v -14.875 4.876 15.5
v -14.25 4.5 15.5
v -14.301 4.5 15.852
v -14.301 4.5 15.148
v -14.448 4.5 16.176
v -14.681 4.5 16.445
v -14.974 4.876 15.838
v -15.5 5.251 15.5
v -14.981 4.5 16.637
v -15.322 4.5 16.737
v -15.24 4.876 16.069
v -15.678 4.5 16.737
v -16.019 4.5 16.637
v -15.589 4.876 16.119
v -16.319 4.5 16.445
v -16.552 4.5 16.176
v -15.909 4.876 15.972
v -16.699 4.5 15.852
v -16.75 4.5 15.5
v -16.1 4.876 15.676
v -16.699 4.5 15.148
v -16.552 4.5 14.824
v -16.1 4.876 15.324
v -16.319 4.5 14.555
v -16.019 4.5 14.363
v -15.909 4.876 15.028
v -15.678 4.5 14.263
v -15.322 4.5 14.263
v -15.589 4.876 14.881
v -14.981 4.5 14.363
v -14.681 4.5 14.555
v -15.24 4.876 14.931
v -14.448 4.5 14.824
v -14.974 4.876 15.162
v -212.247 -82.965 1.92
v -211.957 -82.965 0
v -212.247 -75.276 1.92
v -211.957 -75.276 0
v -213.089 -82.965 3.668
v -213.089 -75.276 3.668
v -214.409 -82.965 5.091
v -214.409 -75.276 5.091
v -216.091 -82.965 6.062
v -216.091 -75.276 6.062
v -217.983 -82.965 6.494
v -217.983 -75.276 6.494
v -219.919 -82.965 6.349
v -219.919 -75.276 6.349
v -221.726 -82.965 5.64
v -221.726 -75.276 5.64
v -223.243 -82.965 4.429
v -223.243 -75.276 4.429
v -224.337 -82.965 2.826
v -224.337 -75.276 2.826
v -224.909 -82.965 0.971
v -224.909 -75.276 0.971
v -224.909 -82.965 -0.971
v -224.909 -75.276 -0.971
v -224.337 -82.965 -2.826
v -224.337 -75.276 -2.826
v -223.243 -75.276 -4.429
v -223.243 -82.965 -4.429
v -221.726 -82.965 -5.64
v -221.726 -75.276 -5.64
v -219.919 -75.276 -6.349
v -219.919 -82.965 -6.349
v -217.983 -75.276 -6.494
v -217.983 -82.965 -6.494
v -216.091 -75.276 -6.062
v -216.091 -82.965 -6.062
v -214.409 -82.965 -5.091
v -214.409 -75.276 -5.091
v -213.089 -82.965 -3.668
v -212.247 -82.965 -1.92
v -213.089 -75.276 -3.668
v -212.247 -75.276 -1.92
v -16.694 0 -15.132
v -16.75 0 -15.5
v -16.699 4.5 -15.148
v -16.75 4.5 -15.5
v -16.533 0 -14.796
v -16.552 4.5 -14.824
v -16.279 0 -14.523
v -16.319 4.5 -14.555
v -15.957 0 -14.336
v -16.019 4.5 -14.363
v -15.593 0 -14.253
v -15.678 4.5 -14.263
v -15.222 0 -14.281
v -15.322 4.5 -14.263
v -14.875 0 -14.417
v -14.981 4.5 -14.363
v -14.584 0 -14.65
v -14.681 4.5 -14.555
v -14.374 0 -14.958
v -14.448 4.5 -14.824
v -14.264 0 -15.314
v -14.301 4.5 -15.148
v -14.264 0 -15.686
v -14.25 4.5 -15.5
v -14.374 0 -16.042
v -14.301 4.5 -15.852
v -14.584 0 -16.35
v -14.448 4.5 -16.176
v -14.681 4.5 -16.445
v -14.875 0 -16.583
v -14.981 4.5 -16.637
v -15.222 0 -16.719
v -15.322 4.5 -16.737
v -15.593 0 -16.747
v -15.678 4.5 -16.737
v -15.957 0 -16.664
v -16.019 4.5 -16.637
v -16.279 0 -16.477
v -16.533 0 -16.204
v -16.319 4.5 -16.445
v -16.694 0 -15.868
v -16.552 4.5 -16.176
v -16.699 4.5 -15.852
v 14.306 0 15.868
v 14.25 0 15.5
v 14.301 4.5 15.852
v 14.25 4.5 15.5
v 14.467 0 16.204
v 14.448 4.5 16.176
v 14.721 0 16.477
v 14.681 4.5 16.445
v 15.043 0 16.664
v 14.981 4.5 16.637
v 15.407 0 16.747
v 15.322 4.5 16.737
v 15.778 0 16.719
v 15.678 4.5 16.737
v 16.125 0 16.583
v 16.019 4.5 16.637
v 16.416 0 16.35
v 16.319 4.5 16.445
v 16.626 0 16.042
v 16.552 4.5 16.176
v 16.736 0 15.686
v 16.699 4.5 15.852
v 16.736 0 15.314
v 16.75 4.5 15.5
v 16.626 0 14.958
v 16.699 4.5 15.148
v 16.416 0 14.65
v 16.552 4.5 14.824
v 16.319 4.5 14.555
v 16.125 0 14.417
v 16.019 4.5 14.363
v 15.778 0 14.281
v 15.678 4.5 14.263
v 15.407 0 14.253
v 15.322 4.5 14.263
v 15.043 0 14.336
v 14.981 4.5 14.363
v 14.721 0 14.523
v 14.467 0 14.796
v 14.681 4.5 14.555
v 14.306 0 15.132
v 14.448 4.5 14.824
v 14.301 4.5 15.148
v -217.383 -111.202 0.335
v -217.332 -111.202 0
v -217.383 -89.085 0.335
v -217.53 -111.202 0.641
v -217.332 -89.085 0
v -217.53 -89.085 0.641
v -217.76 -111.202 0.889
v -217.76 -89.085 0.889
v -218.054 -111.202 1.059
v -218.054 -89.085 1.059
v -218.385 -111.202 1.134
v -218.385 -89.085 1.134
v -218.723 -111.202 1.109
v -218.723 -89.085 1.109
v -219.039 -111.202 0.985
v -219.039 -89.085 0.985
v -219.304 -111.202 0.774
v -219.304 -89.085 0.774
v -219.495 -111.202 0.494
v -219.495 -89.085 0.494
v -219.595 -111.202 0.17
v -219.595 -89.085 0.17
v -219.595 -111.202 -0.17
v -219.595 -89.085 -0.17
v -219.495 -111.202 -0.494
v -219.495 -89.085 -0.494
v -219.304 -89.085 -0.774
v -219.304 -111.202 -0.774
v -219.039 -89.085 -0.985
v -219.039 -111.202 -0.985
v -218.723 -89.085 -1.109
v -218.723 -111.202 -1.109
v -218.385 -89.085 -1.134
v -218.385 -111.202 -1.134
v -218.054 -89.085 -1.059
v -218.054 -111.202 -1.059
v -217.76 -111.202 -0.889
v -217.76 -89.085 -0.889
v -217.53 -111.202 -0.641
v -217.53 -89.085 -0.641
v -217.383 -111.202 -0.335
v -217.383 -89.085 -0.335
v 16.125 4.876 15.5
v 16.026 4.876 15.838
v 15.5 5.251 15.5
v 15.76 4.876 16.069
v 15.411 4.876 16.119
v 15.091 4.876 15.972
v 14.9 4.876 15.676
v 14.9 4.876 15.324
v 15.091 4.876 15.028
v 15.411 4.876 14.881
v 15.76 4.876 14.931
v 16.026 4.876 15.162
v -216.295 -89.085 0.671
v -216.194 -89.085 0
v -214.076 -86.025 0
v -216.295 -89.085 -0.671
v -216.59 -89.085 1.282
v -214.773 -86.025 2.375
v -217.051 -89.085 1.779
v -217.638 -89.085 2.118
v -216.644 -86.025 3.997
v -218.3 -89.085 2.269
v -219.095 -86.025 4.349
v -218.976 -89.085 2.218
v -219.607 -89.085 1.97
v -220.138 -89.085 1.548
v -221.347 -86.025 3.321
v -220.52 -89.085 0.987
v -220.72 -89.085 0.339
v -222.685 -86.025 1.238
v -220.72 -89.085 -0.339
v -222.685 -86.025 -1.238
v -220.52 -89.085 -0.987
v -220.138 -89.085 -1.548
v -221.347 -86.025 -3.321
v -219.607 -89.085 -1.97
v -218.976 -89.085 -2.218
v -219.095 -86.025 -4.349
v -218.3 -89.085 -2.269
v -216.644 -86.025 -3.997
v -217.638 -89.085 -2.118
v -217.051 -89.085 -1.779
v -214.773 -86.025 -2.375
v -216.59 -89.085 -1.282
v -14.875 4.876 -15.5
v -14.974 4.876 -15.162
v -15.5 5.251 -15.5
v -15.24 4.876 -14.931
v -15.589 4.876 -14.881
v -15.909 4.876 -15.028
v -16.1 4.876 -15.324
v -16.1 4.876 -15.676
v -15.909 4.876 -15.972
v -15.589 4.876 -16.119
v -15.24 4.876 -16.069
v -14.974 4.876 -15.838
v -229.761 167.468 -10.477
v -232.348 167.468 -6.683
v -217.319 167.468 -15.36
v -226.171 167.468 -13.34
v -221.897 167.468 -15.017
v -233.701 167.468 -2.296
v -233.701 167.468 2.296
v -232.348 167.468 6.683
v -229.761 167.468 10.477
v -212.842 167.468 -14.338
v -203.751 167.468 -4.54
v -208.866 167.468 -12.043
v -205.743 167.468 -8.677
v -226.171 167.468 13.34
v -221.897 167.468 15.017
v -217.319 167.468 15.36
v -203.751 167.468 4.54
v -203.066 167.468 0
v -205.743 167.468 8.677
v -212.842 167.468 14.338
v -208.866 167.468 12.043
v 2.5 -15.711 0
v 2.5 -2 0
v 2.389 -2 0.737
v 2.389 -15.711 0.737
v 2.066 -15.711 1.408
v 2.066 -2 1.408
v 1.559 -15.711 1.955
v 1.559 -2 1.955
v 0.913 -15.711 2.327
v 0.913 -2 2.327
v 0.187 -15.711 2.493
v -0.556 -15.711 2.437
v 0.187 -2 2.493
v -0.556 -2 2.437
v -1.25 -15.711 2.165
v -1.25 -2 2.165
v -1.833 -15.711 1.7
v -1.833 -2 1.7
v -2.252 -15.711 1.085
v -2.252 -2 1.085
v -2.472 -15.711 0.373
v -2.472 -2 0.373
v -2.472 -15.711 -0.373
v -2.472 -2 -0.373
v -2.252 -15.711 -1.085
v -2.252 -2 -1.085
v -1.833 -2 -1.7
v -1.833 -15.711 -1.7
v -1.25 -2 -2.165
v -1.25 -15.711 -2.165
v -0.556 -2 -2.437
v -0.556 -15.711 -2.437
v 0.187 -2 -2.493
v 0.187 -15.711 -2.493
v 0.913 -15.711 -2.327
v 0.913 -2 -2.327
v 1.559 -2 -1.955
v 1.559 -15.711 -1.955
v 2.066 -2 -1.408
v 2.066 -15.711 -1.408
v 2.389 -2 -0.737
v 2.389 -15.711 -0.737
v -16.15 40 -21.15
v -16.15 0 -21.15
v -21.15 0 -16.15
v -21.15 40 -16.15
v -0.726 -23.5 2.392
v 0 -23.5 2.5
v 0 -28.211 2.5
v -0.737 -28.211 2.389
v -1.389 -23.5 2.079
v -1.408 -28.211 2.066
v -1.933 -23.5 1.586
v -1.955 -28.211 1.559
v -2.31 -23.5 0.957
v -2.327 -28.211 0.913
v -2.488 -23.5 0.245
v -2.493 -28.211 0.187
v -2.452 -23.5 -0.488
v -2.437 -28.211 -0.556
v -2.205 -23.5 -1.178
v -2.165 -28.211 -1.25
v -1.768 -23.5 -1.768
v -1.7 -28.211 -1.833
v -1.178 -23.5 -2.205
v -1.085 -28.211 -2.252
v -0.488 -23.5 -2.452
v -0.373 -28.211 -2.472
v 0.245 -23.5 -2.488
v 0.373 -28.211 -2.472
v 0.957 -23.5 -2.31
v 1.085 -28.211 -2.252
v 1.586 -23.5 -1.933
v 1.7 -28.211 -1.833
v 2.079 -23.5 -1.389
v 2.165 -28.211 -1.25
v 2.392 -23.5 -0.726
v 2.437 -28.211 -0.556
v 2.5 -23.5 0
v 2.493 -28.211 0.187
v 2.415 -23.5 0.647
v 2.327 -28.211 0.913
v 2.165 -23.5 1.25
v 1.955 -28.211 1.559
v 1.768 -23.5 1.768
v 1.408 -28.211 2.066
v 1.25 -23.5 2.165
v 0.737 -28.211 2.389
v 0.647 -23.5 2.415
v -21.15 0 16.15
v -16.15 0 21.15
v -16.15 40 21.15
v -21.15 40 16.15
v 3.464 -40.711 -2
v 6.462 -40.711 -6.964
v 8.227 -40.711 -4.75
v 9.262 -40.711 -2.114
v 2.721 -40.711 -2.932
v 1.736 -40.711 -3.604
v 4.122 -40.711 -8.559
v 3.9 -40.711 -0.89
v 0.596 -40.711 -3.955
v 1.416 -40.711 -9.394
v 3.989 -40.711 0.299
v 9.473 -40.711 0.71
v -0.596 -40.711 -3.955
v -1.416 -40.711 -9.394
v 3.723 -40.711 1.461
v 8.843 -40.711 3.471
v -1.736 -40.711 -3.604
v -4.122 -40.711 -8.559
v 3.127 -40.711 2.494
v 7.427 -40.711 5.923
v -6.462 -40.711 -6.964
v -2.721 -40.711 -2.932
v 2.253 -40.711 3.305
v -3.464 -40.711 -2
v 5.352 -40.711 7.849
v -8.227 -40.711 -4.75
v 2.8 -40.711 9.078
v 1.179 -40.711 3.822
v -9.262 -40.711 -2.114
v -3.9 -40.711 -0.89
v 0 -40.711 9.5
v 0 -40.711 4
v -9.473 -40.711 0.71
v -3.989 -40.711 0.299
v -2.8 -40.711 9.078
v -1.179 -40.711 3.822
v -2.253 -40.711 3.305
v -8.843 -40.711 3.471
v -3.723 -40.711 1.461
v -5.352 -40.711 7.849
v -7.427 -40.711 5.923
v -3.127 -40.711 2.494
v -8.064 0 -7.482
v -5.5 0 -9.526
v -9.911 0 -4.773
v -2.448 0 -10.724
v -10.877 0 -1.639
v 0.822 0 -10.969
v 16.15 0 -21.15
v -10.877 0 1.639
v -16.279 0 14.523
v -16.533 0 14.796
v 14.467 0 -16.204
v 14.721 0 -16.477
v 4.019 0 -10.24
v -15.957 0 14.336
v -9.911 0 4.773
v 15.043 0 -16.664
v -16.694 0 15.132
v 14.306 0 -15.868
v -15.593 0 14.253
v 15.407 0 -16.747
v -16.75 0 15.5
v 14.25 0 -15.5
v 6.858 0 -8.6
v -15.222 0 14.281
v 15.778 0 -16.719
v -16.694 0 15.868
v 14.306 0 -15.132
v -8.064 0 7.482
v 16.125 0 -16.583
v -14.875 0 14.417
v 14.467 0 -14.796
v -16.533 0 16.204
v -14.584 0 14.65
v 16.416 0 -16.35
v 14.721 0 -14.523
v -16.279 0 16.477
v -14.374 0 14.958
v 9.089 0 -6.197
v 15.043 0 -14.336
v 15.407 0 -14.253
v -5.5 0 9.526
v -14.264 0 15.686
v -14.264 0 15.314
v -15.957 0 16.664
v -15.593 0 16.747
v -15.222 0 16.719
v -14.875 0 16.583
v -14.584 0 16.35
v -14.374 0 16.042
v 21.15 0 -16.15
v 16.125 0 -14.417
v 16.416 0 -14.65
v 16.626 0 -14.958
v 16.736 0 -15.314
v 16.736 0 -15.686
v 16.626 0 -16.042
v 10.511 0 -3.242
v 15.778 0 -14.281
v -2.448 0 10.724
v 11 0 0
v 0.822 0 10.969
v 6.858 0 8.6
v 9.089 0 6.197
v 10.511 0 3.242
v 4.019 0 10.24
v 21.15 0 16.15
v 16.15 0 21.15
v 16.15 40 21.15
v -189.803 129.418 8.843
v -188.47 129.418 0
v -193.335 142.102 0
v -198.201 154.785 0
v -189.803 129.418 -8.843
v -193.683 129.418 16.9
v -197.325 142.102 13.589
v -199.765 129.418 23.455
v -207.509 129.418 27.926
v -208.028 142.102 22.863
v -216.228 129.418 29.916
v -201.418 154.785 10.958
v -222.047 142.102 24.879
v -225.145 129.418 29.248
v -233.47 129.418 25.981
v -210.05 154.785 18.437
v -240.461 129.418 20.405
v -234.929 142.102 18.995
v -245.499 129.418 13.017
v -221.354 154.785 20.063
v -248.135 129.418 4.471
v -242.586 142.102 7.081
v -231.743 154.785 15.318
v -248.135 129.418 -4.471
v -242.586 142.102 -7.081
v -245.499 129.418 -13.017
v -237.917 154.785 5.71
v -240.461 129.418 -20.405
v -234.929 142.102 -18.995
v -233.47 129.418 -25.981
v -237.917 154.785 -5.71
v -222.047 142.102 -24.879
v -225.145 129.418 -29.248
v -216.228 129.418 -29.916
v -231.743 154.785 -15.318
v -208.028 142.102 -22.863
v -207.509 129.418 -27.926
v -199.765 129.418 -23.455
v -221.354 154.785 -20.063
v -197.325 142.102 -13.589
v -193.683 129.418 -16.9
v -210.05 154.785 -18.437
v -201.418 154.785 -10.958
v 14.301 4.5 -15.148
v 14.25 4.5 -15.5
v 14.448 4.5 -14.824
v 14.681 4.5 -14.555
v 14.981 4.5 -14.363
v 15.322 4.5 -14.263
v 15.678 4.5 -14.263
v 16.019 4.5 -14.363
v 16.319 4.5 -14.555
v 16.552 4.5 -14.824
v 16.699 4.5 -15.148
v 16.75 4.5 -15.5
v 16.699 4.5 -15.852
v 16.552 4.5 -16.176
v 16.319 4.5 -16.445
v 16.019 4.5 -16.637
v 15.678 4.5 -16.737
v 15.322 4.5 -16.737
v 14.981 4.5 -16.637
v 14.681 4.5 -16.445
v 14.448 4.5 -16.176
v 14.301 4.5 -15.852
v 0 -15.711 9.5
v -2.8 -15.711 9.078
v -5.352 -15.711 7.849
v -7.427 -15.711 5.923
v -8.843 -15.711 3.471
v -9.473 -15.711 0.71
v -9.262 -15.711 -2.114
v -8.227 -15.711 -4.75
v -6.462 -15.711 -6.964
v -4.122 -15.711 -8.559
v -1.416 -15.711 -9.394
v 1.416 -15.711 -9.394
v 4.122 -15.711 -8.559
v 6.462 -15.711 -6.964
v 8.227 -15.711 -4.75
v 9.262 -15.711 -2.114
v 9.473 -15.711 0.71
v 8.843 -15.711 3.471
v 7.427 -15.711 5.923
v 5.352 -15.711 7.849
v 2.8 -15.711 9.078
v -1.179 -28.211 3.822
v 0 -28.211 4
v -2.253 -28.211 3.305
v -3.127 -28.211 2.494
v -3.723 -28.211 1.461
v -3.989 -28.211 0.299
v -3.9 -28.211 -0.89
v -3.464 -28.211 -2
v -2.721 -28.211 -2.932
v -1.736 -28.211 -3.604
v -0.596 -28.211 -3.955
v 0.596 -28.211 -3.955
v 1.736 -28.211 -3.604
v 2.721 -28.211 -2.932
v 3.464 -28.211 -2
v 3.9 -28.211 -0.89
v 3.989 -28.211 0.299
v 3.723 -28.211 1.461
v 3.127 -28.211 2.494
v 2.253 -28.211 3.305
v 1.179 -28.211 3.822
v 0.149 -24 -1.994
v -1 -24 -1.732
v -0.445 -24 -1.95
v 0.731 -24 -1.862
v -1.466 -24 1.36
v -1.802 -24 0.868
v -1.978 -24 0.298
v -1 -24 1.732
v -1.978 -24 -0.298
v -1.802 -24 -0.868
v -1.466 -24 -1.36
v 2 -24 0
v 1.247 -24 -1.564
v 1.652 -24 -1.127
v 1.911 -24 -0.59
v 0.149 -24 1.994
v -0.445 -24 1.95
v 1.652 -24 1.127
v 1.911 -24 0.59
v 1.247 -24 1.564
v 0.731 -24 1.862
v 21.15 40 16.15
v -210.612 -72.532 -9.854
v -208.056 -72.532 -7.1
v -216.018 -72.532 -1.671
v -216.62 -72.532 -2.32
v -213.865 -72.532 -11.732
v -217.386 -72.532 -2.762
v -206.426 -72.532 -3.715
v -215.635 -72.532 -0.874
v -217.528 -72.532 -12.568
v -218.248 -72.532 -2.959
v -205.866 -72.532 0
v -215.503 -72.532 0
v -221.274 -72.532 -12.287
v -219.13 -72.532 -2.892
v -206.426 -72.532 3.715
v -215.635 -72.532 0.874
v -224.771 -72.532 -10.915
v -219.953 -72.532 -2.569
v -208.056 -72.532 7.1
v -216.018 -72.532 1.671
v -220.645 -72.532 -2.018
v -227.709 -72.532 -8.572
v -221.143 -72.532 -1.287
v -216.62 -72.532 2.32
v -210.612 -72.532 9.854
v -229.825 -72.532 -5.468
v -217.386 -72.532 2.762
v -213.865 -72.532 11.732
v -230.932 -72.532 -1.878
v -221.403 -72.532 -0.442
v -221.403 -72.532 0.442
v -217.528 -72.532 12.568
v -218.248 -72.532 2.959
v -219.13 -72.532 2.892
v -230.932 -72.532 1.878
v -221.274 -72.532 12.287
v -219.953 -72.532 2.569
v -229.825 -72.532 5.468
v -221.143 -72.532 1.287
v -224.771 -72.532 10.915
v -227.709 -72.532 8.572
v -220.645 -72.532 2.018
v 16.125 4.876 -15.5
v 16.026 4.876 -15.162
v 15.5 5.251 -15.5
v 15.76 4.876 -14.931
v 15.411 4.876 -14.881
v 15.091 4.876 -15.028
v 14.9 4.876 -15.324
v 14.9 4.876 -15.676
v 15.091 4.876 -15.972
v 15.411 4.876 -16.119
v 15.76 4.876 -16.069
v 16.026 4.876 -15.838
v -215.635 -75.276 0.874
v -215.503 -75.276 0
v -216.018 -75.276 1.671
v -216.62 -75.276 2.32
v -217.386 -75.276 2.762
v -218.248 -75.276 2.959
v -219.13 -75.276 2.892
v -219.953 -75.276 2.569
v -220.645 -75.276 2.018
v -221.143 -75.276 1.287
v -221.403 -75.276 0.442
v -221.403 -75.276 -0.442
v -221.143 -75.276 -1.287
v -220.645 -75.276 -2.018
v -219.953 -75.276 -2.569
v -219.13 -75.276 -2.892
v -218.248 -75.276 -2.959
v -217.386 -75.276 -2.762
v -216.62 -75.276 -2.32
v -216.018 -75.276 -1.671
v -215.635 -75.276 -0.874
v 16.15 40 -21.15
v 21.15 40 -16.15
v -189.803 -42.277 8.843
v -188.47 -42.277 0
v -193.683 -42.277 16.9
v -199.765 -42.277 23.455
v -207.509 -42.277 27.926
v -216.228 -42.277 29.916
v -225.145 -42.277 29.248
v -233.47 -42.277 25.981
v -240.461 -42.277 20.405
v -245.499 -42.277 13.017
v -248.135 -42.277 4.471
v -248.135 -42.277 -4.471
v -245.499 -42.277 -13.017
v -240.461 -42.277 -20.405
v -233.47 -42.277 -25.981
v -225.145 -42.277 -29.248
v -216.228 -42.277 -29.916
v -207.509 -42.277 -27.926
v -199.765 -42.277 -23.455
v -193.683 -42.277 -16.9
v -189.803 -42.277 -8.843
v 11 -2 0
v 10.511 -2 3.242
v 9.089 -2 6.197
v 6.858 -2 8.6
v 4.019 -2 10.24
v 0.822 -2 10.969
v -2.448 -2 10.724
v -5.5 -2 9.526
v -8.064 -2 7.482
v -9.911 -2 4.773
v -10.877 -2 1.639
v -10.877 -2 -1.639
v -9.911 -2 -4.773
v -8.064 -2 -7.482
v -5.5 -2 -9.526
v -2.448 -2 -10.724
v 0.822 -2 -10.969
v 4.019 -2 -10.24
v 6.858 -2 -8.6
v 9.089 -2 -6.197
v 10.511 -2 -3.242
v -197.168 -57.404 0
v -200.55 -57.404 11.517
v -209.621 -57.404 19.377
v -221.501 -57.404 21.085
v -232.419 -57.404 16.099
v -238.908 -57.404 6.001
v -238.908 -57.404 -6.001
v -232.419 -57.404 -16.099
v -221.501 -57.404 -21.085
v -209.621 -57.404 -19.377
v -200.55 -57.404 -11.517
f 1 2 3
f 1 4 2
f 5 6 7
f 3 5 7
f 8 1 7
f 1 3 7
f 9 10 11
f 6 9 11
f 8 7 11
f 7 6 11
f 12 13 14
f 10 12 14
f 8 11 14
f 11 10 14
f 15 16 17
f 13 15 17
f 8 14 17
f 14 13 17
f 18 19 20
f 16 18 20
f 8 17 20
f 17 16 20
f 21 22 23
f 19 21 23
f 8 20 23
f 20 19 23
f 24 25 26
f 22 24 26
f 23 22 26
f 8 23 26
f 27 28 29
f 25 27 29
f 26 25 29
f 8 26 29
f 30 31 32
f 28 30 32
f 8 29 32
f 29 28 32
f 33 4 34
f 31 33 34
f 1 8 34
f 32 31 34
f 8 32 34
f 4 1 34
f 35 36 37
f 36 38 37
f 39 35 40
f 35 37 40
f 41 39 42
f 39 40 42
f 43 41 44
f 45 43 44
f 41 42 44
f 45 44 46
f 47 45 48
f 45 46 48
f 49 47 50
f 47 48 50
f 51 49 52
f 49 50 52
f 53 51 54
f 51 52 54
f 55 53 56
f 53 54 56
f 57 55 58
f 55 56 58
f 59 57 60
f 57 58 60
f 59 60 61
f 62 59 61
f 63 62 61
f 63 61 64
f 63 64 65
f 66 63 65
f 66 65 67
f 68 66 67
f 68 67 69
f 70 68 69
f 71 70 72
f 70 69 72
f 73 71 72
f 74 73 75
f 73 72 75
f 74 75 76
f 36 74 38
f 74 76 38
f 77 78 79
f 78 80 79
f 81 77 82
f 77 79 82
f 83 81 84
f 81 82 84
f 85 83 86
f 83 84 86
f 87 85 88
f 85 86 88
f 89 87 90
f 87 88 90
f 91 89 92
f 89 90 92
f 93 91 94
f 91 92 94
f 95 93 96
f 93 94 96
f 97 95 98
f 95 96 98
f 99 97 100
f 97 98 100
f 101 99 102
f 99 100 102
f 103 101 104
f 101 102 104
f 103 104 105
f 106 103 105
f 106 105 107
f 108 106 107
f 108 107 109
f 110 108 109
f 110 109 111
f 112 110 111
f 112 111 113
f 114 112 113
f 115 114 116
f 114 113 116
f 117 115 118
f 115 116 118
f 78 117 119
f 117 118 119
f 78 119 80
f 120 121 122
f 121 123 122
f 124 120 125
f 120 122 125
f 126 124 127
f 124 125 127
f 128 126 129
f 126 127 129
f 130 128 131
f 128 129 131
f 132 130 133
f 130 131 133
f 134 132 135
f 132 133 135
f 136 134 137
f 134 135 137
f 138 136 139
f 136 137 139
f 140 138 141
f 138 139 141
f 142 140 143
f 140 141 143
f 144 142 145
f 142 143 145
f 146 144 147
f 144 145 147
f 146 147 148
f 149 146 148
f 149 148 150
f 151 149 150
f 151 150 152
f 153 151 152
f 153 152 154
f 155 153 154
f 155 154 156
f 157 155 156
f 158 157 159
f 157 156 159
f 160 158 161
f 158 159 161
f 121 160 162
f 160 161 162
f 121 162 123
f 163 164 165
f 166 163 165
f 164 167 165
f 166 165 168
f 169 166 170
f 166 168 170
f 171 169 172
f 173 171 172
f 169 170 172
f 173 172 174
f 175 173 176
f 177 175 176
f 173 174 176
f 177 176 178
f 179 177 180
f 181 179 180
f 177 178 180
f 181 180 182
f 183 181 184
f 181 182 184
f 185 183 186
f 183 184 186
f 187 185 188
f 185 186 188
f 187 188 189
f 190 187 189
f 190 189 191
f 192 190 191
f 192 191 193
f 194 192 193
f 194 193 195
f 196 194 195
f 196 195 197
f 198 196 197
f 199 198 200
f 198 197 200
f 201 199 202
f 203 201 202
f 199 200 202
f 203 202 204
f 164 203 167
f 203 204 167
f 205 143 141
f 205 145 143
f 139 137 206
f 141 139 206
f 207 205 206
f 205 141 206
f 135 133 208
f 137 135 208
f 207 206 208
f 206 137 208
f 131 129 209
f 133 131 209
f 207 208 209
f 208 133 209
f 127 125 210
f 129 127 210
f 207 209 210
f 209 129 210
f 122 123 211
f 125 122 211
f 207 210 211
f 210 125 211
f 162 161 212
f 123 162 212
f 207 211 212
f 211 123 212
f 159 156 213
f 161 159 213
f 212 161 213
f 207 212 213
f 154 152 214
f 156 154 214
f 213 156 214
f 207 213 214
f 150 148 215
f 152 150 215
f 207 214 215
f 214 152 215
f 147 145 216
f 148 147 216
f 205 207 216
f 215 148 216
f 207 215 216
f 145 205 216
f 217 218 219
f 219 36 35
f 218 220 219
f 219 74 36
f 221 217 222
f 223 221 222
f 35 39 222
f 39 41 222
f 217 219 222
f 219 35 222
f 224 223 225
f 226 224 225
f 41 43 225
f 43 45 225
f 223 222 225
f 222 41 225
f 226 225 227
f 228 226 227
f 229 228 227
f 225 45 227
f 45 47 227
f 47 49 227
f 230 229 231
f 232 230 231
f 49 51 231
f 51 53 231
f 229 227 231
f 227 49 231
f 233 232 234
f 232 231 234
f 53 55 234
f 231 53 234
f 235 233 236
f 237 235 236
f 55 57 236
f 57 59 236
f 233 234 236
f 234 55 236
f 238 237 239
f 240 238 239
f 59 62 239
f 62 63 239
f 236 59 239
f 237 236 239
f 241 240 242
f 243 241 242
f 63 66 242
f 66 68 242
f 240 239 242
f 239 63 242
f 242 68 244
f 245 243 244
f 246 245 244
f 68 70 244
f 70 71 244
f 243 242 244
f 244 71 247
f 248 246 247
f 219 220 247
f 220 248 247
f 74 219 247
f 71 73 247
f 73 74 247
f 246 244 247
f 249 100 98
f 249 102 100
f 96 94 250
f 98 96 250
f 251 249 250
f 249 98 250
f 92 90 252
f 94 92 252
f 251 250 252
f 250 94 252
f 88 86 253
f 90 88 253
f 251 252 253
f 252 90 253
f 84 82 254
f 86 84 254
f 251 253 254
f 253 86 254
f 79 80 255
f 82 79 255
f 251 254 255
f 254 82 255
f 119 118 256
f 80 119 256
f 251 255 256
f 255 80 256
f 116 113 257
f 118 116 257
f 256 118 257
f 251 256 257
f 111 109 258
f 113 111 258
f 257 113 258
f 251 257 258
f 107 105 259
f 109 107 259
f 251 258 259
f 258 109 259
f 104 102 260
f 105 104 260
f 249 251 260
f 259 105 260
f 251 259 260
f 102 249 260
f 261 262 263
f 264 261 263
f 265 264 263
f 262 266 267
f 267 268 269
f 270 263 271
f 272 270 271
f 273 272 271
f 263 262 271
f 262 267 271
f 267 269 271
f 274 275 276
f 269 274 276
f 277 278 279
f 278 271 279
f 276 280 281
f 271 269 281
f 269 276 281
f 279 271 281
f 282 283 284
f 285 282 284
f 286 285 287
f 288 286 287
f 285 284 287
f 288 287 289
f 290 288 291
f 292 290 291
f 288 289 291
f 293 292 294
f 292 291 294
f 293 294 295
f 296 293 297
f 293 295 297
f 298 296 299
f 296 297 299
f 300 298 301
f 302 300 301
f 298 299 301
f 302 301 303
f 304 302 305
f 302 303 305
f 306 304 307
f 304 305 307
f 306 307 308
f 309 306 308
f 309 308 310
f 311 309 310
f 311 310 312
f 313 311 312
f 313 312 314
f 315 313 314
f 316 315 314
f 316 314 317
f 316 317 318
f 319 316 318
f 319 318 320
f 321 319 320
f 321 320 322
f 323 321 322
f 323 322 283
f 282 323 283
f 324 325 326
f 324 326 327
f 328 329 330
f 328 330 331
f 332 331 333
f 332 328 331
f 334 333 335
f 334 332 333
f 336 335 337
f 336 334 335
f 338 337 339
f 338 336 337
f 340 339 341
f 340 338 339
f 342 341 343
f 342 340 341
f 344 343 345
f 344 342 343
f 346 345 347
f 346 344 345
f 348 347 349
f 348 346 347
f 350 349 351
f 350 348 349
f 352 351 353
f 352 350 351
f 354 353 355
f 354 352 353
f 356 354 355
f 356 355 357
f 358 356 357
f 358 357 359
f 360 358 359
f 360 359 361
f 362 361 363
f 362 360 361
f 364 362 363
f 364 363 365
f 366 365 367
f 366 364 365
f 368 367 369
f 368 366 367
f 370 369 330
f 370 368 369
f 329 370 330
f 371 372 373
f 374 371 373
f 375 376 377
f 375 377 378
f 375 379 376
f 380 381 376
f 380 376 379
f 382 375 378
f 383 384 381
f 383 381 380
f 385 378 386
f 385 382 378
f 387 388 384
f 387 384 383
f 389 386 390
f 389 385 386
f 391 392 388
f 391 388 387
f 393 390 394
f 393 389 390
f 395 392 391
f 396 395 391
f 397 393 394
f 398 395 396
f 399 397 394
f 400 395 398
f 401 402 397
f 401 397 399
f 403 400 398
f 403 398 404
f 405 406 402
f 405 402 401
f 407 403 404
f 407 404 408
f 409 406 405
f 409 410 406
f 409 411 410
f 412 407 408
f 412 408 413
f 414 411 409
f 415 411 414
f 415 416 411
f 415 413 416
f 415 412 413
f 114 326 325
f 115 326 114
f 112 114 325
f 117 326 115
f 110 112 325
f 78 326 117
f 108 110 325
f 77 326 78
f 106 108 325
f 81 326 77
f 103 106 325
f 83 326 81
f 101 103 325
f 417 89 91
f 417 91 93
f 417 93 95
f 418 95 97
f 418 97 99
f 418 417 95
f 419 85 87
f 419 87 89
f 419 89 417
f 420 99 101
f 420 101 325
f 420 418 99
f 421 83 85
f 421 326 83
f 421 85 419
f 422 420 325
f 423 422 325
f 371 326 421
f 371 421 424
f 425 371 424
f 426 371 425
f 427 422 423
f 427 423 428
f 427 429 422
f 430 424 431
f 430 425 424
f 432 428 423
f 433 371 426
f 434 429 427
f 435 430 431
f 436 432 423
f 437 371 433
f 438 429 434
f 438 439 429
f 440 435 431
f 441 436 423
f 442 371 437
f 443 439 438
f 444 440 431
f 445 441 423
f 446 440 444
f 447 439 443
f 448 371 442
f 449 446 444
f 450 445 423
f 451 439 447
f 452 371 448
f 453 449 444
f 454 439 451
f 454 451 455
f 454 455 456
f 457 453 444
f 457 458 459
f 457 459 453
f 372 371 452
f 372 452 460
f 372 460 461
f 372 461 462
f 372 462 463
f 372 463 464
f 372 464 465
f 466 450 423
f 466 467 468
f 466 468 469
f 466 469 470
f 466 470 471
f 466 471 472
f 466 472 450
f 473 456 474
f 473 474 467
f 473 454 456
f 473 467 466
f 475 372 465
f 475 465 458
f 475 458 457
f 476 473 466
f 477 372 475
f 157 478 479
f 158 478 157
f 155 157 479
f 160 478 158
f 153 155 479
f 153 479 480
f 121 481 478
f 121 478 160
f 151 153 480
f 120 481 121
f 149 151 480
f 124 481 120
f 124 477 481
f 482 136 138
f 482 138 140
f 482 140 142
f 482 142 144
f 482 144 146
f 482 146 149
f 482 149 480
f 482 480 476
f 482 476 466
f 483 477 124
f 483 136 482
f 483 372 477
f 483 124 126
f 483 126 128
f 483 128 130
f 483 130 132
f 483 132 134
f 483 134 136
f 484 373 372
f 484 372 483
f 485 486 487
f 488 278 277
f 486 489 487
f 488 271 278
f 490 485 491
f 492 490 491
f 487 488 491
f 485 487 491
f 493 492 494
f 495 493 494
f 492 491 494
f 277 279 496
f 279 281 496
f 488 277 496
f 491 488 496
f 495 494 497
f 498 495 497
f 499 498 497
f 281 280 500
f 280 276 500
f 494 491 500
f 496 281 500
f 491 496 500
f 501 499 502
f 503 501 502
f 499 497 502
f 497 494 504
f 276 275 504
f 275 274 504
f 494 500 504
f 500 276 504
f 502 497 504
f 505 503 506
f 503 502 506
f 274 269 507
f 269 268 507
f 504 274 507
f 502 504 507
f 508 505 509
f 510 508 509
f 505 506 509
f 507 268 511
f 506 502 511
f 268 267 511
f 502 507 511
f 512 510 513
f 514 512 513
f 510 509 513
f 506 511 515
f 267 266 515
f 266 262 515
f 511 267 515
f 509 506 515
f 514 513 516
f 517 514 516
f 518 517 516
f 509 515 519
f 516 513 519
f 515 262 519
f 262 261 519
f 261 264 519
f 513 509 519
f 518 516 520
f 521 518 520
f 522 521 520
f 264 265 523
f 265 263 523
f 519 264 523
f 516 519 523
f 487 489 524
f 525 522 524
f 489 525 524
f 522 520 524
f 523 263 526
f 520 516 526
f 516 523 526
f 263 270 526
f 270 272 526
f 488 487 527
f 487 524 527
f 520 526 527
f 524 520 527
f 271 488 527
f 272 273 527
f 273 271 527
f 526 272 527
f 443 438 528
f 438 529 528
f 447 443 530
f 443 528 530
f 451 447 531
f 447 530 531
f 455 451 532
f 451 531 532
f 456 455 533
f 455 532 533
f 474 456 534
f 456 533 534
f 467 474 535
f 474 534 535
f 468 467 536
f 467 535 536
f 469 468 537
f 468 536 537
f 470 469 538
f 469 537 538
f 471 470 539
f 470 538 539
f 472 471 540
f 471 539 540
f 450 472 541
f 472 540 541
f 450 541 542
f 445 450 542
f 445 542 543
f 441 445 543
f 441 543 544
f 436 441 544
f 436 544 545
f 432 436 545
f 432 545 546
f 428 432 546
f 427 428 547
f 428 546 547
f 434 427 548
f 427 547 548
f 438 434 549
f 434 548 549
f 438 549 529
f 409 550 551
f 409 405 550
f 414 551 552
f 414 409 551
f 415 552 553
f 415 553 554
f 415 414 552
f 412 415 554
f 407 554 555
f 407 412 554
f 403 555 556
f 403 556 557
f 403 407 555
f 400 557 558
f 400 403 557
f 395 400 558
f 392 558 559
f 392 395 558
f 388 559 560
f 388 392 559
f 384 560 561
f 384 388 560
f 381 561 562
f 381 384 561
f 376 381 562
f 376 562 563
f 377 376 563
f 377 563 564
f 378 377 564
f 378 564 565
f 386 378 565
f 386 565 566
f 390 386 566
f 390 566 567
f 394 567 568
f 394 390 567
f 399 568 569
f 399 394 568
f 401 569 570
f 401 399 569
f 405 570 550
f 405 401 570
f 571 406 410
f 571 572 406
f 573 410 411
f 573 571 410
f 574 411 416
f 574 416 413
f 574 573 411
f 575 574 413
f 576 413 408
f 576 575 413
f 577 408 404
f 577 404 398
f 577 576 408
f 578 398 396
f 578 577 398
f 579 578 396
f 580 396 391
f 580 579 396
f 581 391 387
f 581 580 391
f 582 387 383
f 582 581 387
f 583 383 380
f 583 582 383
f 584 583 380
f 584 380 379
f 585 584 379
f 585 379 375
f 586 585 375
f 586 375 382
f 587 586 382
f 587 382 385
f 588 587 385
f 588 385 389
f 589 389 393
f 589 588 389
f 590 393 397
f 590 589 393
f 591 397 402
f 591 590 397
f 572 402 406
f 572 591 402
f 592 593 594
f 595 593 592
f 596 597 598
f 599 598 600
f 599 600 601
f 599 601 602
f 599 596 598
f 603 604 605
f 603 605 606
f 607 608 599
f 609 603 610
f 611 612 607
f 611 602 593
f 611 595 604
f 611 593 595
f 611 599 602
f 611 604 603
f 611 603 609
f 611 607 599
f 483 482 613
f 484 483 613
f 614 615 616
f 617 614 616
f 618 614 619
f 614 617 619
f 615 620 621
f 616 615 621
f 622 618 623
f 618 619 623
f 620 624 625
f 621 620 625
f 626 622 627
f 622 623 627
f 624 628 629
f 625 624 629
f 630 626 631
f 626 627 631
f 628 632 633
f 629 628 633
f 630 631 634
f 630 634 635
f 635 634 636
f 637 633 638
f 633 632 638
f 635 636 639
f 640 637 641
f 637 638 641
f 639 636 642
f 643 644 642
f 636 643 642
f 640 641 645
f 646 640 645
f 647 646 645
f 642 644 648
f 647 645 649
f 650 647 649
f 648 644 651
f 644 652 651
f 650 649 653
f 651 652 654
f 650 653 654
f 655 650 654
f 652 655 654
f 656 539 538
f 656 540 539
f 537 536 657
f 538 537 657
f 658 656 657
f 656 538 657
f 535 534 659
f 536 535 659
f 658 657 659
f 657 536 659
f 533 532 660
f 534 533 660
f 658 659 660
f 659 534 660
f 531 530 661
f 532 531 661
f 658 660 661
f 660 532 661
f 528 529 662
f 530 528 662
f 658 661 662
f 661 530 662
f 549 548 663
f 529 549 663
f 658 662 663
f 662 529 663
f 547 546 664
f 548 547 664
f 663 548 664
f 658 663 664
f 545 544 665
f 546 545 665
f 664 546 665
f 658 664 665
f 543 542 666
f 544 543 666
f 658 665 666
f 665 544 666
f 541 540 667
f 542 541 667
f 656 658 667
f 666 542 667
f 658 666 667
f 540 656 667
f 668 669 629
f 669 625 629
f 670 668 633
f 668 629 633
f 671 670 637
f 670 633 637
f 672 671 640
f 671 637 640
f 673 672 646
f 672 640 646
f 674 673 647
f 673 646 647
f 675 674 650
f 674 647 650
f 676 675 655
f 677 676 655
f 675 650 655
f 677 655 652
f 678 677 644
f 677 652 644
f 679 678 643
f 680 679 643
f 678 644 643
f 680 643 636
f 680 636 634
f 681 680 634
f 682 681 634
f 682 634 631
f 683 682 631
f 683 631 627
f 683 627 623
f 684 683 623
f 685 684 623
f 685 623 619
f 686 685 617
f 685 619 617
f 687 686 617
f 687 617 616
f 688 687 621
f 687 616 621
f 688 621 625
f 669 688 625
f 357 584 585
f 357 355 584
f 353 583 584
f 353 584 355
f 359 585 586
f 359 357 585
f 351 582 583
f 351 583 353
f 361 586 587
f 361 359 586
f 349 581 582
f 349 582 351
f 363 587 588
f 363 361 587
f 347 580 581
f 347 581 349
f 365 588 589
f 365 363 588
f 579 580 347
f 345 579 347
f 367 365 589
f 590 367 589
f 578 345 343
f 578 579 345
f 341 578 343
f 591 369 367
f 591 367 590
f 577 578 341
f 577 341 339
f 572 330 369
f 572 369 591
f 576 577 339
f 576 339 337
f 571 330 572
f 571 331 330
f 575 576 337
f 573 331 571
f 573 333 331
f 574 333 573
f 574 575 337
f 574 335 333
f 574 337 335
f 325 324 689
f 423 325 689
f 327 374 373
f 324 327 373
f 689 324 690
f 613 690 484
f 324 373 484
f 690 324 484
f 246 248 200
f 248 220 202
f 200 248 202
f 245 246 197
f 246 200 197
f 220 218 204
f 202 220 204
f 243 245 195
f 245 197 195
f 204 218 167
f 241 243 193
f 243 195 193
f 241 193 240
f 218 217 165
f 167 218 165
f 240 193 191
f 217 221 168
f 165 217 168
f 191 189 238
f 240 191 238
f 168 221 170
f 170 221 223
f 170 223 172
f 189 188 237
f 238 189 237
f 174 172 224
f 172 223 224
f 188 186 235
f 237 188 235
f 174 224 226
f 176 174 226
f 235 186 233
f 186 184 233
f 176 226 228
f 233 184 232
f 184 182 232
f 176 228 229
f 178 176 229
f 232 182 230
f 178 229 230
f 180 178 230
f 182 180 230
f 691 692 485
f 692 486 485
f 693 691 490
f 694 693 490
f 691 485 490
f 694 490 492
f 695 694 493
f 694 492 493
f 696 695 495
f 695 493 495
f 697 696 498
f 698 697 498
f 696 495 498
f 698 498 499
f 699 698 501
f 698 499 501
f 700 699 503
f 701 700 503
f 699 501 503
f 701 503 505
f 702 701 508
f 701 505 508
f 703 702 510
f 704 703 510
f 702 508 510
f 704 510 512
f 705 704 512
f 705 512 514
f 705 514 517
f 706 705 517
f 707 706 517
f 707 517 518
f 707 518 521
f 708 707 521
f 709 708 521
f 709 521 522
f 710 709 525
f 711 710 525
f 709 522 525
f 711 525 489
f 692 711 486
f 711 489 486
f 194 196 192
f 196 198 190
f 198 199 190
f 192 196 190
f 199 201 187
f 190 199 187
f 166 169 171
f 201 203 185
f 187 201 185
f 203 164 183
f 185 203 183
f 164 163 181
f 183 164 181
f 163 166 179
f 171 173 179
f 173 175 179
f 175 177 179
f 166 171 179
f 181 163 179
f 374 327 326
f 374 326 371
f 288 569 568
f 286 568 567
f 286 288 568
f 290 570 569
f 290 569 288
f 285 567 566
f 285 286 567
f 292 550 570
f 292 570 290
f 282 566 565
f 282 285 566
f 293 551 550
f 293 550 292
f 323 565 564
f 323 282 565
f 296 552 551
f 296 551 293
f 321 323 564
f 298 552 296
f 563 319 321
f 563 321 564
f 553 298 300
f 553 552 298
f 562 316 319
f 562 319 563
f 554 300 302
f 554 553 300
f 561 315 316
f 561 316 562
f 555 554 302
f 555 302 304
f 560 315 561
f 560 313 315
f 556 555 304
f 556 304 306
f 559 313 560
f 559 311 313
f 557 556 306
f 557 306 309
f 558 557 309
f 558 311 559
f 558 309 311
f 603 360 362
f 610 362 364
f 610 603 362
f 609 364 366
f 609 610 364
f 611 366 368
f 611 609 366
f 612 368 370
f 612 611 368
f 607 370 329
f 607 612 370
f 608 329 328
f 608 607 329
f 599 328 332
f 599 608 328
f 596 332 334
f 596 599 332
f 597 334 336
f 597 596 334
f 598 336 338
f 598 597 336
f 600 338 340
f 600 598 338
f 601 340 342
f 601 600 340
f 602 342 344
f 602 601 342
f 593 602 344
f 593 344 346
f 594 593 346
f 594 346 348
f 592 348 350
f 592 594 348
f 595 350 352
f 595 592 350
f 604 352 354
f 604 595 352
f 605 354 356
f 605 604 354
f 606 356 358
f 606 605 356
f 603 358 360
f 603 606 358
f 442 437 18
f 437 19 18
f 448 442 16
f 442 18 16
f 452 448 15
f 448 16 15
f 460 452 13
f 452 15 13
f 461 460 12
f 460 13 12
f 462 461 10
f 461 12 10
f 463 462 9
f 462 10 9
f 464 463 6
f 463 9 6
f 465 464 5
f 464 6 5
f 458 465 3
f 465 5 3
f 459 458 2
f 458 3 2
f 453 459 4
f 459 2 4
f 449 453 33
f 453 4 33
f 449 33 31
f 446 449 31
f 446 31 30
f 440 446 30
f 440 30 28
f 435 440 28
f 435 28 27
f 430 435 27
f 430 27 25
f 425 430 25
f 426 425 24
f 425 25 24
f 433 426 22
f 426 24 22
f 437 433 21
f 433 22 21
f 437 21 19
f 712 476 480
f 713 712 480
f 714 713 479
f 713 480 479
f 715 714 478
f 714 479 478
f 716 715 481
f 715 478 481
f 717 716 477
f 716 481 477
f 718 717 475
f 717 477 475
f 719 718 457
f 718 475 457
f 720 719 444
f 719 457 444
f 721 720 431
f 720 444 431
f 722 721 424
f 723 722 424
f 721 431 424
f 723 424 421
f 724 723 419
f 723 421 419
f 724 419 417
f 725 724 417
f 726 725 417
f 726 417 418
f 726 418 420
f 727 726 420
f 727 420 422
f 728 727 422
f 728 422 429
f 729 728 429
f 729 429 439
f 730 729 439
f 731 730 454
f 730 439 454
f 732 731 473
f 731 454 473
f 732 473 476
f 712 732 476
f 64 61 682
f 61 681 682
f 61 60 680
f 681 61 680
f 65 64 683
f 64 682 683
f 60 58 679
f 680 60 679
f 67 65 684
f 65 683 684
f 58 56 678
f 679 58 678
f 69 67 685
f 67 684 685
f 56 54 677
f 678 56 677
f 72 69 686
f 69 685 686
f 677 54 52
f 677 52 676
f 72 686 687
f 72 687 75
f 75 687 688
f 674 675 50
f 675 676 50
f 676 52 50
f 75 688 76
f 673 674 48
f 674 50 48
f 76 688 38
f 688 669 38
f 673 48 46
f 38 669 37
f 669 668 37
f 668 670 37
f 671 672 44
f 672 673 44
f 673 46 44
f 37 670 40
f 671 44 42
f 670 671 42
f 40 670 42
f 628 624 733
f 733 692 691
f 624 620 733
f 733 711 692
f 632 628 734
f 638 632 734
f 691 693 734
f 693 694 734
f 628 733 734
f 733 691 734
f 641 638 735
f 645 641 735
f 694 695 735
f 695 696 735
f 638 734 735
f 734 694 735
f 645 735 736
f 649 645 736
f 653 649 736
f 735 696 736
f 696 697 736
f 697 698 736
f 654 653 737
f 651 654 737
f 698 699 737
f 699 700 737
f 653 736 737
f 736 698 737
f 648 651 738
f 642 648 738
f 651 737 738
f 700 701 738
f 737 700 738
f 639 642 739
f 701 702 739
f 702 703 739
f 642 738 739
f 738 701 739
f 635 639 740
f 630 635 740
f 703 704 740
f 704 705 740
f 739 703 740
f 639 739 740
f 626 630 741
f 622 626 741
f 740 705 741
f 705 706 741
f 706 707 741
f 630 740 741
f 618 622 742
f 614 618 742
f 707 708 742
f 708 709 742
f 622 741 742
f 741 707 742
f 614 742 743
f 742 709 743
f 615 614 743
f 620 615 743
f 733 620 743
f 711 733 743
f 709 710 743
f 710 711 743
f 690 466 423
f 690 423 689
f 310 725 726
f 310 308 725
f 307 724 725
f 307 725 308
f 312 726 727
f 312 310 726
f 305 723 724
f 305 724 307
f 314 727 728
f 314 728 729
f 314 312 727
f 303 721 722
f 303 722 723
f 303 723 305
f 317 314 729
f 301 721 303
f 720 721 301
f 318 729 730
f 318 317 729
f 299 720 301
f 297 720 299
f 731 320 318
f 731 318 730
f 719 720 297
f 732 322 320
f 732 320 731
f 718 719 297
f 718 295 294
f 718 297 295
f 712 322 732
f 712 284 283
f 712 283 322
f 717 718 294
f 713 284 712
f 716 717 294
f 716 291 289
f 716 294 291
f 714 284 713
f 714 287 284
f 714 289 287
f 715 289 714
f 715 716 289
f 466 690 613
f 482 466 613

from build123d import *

# Parameters (mm, degrees)
F0_W     = 42.3
F0_H     = 42.3
F0_R     = 11
F0_R_2   = 2.5
F1_DEPTH = 40
F2_DEPTH = 2
F3_DEPTH = 24
F4_SIZE  = 5
F5_D     = 2.5
F5_DEPTH = 4.5
F5_TIP   = 0.7510757738
F6_SIZE  = 0.5
F9_W     = 1.1376658082
F9_H     = 22.1167653799


with BuildPart() as f1:
    # F0 (on Front) → F1 (new body)
    with BuildSketch(Plane.XZ):
        Rectangle(F0_W, F0_H)
        Circle(F0_R, mode=Mode.SUBTRACT)
        Circle(F0_R)
        Circle(F0_R_2, mode=Mode.SUBTRACT)
        Circle(F0_R_2)
    extrude(amount=-F1_DEPTH)

    # F0 (on Front) → F2 (join)
    with BuildSketch(Plane.XZ):
        Circle(F0_R)
        Circle(F0_R_2, mode=Mode.SUBTRACT)
    extrude(amount=F2_DEPTH)

    # F0 (on Front) → F3 (join)
    with BuildSketch(Plane.XZ):
        Circle(F0_R_2)
    extrude(amount=F3_DEPTH)

    # F4
    f4_edges = [f1.edges().sort_by_distance(p)[0] for p in [
        (21.15, 20, 21.15),
        (-21.15, 20, 21.15),
        (21.15, 20, -21.15),
        (-21.15, 20, -21.15),
    ]]
    chamfer(f4_edges, length=F4_SIZE)

    # F5
    with Locations(Plane.XZ):
        with Locations((-15.5, 15.5), (15.5, 15.5), (15.5, -15.5), (-15.5, -15.5)):
            Hole(F5_D / 2, depth=F5_DEPTH)
            with Locations((0, 0, -(F5_DEPTH + F5_TIP / 2))):  # 118° drill point
                Cone(0, F5_D / 2, F5_TIP, mode=Mode.SUBTRACT)

    # F6
    f6_edges = [f1.edges().sort_by_distance(p)[0] for p in [
        (-2.5, -24, 0),
    ]]
    chamfer(f6_edges, length=F6_SIZE)

    # F7 (on Right) → F8 (revolve)
    with BuildSketch(Plane.YZ):
        Polygon((-40.7108180225, 9.5), (-40.7108180225, 4), (-28.2108180225, 4), (-28.2108180225, 2.5), (-15.7108180225, 2.5), (-15.7108180225, 9.5), align=None)
    revolve(axis=Axis((0, -12.2175939753, 0), (0, -1, 0)))


with BuildPart() as f10:
    # F9 (on Top) → F10 (revolve)
    with BuildSketch(Plane.XY):
        Polygon((-203.0664789146, 167.4681340763), (-218.4696930647, 167.4681340763), (-218.4696930647, -89.0853926539), (-217.3320272565, -89.0853926539), (-216.1943614483, -89.0853926539), (-211.9574993849, -82.965478301), (-211.9574993849, -75.2763524652), (-215.5028455897, -75.2763524652), (-215.5028455897, -72.5318659237), (-205.8664813202, -72.5318659237), (-188.4696930647, -42.2765792686), (-188.4696930647, 129.4182986021), align=None)
        with Locations((-217.9008601606, -100.1437753439)):
            Rectangle(F9_W, F9_H)
    revolve(axis=Axis((-218.4696930647, -2.1318495274, 0), (0, -1, 0)))


solid = Compound([f1.part, f10.part])
